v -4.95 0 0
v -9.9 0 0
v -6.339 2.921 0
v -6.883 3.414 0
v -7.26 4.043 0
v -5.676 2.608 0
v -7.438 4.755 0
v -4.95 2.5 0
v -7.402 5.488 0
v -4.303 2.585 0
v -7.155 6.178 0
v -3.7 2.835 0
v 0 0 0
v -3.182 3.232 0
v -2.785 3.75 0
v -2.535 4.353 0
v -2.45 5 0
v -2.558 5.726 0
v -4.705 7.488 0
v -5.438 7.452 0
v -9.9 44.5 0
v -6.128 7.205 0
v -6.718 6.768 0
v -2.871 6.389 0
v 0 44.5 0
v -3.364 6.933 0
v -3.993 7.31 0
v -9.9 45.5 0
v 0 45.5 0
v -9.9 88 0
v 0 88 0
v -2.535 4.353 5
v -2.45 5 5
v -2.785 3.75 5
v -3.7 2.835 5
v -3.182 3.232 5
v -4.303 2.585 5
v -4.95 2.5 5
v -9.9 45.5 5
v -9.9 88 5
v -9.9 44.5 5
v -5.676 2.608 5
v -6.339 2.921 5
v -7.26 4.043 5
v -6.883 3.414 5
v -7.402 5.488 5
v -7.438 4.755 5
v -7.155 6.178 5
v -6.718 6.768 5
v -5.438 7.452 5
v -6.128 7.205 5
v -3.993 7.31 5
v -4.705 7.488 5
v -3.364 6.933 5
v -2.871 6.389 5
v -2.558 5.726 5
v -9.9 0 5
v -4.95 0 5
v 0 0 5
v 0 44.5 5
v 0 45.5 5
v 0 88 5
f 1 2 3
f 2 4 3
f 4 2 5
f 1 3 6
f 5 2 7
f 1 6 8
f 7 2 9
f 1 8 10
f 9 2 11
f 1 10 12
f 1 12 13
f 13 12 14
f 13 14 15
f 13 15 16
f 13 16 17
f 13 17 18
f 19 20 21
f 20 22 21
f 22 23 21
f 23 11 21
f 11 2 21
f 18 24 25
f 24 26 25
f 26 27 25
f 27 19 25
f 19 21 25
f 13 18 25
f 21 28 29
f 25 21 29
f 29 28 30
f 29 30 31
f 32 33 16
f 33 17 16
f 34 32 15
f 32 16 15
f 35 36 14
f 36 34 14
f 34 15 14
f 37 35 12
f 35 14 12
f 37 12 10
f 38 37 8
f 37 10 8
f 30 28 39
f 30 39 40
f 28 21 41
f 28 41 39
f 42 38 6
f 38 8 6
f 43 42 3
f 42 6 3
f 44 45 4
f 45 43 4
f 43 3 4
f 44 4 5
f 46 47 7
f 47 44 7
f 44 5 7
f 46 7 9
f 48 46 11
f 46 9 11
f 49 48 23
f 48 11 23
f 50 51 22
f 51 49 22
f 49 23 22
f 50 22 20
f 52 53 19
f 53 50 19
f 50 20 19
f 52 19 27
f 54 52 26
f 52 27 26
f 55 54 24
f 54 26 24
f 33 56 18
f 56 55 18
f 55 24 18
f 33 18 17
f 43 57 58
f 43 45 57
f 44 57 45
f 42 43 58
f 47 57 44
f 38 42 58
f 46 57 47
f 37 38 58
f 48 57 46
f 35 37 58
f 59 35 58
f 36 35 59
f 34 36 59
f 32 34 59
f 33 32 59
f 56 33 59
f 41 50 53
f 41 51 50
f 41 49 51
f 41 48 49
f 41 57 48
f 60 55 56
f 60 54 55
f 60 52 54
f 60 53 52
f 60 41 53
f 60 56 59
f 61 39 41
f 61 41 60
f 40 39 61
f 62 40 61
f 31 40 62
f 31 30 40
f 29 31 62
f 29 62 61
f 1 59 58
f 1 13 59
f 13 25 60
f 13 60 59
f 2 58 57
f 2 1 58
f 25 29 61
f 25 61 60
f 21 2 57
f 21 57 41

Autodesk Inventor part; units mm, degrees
ref_plane "YZ Plane" through (0, 0, 0) normal (1, 0, 0) x (0, 1, 0)
ref_plane "XZ Plane" through (0, 0, 0) normal (0, 1, 0) x (-1, 0, 0)
ref_plane "XY Plane" through (0, 0, 0) normal (0, 0, 1) x (1, 0, 0)
sketch "Sketch2" plane through (0, 0, 0) normal (0, 0, 1) x (1, 0, 0)
  line L0 (0, 0) -> (-9.9, 0)
  line L1 (-4.95, 0) -> (-4.95, 2.5)
  line L2 (-4.95, 0) -> (-2.45, 0) construction
  circle A0 centre (-4.95, 5) radius 2.5
  line L3 (-4.95, 7.5) -> (32.05, 7.5) construction
  line L4 (0, 44.5) -> (0, 0)
  line L5 (0, 0) -> (-9.9, 0)
  line L6 (-9.9, 0) -> (-9.9, 44.5)
  line L7 (0, 45.5) -> (0, 0)
  line L8 (0, 0) -> (-9.9, 0)
  line L9 (-9.9, 0) -> (-9.9, 45.5)
  line L10 (-4.95, 7.5) -> (66.05, 7.5) construction
  line L11 (0, 0) -> (-9.9, 0)
  line L12 (-9.9, 0) -> (-9.9, 88)
  line L13 (-9.9, 88) -> (0, 88)
  line L14 (0, 88) -> (0, 0)
  dimension "d35" = 5
  dimension "d33" = 2.5
  dimension "d34" = 90
  dimension "d46" = 88
extrude "Extrusion6" add sketch "Sketch2" along normal blind 5
properties part number "Elbow_Cube_Holder_TestFit_V2"
